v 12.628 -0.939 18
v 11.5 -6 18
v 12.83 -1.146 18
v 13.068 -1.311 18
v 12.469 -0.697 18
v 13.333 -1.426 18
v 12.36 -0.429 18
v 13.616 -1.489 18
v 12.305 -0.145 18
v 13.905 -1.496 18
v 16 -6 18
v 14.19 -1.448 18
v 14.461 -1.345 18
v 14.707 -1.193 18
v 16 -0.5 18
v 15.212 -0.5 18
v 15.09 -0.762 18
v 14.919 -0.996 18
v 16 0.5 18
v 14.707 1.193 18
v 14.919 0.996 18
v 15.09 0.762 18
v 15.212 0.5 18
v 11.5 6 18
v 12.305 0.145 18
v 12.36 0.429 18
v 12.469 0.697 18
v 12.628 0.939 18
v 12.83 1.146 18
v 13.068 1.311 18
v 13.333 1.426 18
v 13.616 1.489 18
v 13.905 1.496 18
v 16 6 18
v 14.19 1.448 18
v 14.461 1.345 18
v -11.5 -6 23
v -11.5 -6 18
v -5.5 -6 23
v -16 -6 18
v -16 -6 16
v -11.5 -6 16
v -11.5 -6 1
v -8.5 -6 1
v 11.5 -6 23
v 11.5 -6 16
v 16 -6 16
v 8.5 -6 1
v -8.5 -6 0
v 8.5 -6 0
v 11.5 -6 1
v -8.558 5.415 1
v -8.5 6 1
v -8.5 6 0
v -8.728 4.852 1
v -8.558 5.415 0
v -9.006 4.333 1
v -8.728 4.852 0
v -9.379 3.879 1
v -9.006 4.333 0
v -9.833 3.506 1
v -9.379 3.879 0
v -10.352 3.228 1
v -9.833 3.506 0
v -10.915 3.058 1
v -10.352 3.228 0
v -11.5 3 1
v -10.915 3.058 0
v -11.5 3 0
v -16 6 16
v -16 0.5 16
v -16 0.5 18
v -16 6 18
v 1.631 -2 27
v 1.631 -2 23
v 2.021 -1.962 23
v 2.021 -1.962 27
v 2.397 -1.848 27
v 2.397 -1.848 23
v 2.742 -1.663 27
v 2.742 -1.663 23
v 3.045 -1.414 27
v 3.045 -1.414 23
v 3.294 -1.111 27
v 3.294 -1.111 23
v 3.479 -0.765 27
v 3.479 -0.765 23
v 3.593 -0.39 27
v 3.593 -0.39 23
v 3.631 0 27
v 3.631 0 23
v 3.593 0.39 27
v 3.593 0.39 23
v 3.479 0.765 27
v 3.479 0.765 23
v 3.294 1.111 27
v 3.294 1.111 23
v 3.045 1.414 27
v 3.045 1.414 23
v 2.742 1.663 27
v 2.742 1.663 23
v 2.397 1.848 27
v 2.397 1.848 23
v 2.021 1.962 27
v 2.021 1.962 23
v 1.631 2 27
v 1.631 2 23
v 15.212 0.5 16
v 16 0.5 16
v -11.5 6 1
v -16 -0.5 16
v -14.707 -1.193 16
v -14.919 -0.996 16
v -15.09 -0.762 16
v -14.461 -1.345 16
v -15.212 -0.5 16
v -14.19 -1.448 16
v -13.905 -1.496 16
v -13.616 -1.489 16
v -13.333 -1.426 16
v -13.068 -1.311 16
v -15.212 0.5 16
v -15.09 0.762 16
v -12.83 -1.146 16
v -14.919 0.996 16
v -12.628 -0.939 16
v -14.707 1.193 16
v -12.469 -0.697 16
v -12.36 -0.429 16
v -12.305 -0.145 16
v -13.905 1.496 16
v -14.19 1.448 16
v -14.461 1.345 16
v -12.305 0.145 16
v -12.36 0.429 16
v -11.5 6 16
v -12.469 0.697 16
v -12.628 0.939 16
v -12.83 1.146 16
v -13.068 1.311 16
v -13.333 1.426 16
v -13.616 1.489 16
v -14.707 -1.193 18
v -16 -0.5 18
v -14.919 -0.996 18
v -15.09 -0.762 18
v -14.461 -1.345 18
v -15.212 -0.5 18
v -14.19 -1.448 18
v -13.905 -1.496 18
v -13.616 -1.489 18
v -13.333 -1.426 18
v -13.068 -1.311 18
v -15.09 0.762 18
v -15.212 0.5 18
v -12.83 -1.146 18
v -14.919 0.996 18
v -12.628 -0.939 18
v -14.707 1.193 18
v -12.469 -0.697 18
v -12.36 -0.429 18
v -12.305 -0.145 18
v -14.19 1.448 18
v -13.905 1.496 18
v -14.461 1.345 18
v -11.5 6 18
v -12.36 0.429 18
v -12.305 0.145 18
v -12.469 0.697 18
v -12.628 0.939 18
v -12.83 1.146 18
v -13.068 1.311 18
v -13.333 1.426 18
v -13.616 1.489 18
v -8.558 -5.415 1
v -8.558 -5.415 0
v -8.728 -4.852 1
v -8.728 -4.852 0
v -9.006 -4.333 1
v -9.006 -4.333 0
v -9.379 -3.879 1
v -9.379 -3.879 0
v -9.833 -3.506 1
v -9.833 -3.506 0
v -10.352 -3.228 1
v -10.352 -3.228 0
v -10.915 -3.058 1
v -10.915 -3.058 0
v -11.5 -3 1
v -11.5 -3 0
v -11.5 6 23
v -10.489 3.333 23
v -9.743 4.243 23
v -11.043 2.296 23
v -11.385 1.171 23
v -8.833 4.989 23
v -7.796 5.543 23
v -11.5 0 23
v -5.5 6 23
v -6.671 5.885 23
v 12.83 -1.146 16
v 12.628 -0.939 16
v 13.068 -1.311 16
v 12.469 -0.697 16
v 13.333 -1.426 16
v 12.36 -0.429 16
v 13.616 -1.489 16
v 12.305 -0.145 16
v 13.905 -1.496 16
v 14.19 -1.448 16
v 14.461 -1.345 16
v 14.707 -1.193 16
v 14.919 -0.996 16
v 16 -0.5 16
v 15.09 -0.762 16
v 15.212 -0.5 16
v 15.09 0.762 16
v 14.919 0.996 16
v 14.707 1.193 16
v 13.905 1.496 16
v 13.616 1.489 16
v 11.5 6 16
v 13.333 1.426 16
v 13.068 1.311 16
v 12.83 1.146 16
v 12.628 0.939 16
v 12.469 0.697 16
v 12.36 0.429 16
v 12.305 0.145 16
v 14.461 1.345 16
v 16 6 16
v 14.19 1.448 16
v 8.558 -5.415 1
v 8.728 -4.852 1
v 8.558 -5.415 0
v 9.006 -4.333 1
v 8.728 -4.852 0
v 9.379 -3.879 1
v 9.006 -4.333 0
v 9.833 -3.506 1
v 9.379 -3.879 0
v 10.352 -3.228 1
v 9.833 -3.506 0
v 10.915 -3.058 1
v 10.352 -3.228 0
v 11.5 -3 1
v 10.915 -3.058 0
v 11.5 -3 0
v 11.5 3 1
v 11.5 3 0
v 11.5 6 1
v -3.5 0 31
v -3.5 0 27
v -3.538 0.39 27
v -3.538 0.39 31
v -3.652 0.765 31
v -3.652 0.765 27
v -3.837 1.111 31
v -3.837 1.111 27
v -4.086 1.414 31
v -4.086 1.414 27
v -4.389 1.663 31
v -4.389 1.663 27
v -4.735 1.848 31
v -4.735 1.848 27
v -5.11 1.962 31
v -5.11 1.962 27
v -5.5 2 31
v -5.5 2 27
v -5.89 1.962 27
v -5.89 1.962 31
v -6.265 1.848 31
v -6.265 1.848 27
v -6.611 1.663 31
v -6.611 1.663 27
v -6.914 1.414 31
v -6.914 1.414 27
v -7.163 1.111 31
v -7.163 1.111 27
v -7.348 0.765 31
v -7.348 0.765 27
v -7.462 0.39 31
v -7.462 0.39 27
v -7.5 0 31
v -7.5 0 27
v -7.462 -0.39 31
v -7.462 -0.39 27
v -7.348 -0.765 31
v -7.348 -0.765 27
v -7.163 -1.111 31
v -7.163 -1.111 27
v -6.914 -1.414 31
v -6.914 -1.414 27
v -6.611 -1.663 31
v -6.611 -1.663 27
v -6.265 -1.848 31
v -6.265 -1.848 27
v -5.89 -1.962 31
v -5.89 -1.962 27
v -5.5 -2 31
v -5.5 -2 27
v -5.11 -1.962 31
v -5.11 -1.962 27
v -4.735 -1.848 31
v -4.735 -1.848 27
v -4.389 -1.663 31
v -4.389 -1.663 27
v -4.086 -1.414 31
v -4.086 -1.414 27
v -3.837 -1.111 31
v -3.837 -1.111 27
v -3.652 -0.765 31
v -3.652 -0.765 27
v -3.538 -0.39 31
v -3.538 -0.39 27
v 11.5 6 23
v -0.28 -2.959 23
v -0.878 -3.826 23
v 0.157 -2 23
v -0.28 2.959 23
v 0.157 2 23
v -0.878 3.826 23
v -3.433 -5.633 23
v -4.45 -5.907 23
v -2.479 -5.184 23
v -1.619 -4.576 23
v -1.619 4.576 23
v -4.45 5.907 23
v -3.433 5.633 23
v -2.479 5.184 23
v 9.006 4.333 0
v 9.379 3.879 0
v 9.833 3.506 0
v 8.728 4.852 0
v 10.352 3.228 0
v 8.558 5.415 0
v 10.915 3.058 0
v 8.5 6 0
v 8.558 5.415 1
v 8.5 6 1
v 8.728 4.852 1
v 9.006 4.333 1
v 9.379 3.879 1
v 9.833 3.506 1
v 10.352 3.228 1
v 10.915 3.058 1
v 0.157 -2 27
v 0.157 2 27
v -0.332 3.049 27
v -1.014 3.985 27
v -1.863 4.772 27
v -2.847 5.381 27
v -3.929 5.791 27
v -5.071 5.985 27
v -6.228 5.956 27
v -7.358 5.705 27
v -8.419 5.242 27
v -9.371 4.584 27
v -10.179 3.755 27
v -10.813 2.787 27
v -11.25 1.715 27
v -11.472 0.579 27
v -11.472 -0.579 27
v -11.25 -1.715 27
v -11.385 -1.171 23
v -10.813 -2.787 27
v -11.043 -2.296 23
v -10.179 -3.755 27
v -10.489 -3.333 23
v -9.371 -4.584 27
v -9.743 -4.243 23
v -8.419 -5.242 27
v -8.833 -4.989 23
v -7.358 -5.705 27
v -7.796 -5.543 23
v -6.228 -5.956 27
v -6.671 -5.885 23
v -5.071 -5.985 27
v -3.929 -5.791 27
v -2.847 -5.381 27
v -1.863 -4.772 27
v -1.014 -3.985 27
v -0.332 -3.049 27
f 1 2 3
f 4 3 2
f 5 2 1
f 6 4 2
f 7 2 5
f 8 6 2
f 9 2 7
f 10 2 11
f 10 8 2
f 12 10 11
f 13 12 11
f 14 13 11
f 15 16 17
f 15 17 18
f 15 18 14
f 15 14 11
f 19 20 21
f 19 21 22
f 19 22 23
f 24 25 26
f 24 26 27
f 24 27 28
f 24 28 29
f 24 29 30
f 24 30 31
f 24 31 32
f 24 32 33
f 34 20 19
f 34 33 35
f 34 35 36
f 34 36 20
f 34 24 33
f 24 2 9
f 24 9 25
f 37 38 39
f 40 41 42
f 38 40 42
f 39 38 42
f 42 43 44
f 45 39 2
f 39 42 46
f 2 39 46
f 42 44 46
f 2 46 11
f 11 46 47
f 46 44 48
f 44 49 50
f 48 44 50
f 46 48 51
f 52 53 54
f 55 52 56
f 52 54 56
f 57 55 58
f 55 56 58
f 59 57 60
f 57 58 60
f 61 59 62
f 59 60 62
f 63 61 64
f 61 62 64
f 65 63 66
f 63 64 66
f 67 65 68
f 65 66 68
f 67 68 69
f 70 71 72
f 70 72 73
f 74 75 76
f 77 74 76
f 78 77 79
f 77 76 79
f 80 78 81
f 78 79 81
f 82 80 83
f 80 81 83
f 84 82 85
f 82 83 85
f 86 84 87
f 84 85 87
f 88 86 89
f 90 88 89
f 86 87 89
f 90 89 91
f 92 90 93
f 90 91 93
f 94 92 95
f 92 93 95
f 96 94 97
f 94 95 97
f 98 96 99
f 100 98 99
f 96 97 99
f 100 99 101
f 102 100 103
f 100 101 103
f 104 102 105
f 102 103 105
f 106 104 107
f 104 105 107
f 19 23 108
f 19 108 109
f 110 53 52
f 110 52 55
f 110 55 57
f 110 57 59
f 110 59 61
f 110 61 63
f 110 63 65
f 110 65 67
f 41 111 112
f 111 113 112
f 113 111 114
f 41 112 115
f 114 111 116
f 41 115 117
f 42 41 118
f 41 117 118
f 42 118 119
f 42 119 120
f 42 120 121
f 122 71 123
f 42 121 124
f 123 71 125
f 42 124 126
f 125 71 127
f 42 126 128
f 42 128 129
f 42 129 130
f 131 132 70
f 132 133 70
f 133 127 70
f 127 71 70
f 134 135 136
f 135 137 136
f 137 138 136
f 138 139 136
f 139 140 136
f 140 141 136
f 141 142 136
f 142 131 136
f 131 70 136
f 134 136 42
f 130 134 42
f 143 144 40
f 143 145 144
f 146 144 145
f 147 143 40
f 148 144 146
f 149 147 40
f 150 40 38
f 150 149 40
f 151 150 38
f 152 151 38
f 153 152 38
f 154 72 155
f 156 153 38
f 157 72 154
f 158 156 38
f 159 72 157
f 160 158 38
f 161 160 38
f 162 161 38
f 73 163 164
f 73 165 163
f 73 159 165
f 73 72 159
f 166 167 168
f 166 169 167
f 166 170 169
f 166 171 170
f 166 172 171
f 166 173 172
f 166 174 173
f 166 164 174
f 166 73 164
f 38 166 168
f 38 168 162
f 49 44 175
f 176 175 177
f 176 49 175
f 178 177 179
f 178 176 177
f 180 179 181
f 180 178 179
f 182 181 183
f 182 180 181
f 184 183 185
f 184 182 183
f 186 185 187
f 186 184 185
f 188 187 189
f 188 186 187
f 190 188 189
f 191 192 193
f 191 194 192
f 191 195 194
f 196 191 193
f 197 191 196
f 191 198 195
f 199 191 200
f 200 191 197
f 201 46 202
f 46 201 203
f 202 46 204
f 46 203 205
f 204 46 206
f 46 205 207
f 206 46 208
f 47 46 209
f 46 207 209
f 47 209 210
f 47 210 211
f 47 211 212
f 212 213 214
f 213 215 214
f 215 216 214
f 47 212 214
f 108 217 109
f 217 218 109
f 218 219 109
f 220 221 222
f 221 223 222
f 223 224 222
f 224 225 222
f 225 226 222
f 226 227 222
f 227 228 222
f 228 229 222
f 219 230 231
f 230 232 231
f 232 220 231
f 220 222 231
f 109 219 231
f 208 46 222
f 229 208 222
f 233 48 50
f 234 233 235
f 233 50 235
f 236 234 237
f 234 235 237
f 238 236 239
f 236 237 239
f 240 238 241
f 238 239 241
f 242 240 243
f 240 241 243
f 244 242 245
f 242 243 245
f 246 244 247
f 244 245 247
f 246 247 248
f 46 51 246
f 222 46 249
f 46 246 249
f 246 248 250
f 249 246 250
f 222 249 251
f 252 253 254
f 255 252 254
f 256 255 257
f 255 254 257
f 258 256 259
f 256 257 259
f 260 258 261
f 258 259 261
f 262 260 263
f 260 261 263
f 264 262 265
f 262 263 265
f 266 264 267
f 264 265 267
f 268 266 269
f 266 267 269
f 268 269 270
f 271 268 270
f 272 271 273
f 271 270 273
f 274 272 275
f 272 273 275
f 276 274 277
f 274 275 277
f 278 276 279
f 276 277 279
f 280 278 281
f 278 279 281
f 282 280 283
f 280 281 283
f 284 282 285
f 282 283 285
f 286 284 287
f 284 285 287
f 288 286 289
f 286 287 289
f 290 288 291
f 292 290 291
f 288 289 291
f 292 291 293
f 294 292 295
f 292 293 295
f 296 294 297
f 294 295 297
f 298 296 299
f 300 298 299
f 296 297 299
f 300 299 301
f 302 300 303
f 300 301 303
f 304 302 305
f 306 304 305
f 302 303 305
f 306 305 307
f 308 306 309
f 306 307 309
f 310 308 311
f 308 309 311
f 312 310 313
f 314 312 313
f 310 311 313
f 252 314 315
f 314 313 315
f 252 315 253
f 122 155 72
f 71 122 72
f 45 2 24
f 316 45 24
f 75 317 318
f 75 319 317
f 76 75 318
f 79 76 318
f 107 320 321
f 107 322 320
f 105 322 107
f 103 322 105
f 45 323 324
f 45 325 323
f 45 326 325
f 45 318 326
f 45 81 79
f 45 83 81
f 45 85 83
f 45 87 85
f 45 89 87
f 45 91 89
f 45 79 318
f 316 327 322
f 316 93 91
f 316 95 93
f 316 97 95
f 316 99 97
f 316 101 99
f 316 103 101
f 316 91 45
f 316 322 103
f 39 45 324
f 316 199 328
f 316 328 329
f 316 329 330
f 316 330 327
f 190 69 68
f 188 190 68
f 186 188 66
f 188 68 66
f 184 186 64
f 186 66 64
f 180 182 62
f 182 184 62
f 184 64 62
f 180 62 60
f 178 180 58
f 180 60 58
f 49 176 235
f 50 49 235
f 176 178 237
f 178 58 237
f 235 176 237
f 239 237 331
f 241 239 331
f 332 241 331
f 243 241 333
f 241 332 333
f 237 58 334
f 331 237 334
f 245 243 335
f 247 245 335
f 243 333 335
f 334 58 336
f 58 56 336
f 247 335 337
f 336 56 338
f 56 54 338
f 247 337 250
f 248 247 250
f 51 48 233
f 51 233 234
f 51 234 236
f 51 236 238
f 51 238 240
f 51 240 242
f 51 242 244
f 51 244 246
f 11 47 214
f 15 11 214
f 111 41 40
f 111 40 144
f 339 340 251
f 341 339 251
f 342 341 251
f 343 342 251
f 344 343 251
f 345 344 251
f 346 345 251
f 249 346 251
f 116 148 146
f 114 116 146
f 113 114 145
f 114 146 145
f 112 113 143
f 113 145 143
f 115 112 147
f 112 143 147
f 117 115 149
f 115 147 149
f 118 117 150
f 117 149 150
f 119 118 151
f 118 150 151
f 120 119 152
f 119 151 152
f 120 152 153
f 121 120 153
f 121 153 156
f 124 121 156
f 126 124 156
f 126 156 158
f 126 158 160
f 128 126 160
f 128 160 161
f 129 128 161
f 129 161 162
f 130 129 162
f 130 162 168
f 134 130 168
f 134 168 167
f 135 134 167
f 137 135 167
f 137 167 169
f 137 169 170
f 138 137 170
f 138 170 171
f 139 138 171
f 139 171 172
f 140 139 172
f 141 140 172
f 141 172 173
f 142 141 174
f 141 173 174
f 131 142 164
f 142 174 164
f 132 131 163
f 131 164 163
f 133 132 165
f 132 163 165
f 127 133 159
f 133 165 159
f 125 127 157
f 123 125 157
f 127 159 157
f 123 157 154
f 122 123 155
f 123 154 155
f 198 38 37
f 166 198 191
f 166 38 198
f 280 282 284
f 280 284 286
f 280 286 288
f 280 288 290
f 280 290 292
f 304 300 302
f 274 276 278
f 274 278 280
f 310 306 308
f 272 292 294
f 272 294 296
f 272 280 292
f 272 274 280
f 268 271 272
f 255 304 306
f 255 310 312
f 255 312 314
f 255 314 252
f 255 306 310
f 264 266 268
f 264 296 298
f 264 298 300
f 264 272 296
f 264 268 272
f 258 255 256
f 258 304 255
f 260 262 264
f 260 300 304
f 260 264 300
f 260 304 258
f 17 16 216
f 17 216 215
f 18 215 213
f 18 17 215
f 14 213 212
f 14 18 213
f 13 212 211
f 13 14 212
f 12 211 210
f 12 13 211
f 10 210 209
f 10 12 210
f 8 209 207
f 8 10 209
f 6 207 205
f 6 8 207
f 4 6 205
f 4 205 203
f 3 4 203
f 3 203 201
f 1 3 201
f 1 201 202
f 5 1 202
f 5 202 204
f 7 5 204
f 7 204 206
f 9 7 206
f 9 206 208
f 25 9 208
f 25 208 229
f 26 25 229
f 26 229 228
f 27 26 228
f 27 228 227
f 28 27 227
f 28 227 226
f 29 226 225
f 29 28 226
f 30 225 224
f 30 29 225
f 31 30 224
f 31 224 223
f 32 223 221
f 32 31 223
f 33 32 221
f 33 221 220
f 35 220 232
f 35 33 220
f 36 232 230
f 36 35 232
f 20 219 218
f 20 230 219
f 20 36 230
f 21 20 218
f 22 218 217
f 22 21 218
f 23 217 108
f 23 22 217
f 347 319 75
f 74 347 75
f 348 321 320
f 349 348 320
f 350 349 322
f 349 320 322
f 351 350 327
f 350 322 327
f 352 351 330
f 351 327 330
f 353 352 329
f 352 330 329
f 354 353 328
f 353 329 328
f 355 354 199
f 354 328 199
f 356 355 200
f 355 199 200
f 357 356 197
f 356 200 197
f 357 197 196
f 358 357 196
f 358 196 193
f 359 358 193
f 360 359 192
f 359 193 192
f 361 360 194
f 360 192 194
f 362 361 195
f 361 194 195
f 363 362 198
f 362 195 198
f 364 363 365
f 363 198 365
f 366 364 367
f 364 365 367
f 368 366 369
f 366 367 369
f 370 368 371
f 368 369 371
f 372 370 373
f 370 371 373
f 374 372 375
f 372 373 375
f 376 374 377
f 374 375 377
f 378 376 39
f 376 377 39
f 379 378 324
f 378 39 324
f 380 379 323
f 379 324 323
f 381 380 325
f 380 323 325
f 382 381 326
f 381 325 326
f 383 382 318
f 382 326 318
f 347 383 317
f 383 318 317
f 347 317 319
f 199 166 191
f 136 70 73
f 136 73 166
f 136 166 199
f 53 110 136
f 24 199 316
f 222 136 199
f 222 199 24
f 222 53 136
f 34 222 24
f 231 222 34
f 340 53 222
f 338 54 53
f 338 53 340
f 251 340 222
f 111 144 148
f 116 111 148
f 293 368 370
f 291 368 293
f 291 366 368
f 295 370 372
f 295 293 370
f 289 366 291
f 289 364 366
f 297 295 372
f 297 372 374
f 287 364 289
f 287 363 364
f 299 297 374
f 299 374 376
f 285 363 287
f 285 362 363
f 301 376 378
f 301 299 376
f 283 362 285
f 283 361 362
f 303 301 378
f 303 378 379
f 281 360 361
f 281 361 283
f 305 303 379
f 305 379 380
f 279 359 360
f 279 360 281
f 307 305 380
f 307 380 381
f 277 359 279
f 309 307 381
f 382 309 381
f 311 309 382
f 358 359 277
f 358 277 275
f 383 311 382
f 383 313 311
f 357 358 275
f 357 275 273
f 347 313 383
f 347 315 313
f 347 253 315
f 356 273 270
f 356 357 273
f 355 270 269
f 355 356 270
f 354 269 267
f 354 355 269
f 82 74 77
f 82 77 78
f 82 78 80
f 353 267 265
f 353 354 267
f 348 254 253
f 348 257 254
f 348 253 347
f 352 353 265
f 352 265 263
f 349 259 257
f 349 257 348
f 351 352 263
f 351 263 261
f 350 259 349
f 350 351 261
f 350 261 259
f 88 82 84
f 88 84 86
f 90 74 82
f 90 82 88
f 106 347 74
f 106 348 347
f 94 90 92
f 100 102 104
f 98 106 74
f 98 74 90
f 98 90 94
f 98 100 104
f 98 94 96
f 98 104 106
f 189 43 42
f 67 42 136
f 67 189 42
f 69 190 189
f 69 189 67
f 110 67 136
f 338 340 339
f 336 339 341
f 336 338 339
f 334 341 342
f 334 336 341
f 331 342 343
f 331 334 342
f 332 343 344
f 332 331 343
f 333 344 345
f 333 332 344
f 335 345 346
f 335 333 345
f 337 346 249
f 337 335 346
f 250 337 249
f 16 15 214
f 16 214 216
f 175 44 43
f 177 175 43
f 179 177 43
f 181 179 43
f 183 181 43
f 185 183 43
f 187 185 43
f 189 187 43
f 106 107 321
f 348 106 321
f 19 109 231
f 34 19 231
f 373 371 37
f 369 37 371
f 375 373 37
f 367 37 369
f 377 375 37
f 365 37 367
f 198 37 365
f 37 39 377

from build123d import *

# Parameters (mm, degrees)
SKETCH_1_W               = 23
SKETCH_1_H               = 12
EXTRUDE_1_DEPTH          = 16
SKETCH_2_W               = 32
SKETCH_2_H               = 12
EXTRUDE_2_DEPTH          = 2
SKETCH_3_W               = 23
SKETCH_3_H               = 12
EXTRUDE_3_DEPTH          = 5
EXTRUDE_4_DEPTH          = 4
SKETCH_6_R               = 2
EXTRUDE_5_DEPTH          = 4
CUT_EXTRUDE_1_DEPTH      = 4
SKETCH_9_R               = 3
CUT_EXTRUDE_2_DEPTH      = 1
MIRROR_3_COPY_1_SKETCH_R = 3
MIRROR_3_COPY_1_DEPTH    = 1


with BuildPart() as part:
    # 草图1 → 凸台-拉伸1 (new body)
    with BuildSketch(Plane.XY):
        Rectangle(SKETCH_1_W, SKETCH_1_H)
    extrude(amount=EXTRUDE_1_DEPTH)

    # 草图2 → 凸台-拉伸2 (add)
    with BuildSketch(Plane.XY.offset(16)):
        Rectangle(SKETCH_2_W, SKETCH_2_H)
    extrude(amount=EXTRUDE_2_DEPTH)

    # 草图3 → 凸台-拉伸3 (add)
    with BuildSketch(Plane.XY.offset(18)):
        Rectangle(SKETCH_3_W, SKETCH_3_H)
    extrude(amount=EXTRUDE_3_DEPTH)

    # 草图4 → 凸台-拉伸4 (add)
    with BuildSketch(Plane.XY.offset(23)):
        with BuildLine():
            Line((1.631262932, 2), (0.156854249, 2))
            ThreePointArc((0.156854249, 2), (-11.5, 0), (0.156854249, -2))
            Line((0.156854249, -2), (1.631262932, -2))
            ThreePointArc((1.631262932, -2), (3.631262932, 0), (1.631262932, 2))
        make_face()
    extrude(amount=EXTRUDE_4_DEPTH)

    # 草图6 → 凸台-拉伸5 (add)
    with BuildSketch(Plane.XY.offset(27)):
        with Locations((-5.5, 0)):
            Circle(SKETCH_6_R)
    extrude(amount=EXTRUDE_5_DEPTH)

    # 草图8 → 切除-拉伸1 (cut)
    with BuildSketch(Plane.XY.offset(18)):
        with BuildLine():
            Line((15.211851697, 0.5), (16, 0.5))
            Line((16, 0.5), (16, -0.5))
            Line((16, -0.5), (15.211851697, -0.5))
            ThreePointArc((15.211851697, -0.5), (12.297638134, 0), (15.211851697, 0.5))
        make_face()
    cut_extrude_1 = extrude(amount=-CUT_EXTRUDE_1_DEPTH, mode=Mode.SUBTRACT)

    # 镜向1: 切除-拉伸1 across plane
    add(cut_extrude_1.mirror(Plane(origin=(0, 0, 0), x_dir=(0, 0, 1), z_dir=(1, 0, 0))), mode=Mode.SUBTRACT)

    # 草图9 → 切除-拉伸2 (cut)
    with BuildSketch(Plane(origin=(0, 0, 0), x_dir=(-1, 0, 0), z_dir=(0, 0, -1))):
        with Locations((11.5, 6)):
            Circle(SKETCH_9_R)
    cut_extrude_2 = extrude(amount=-CUT_EXTRUDE_2_DEPTH, mode=Mode.SUBTRACT)

    # 镜向2: 切除-拉伸2 across plane
    add(cut_extrude_2.mirror(Plane(origin=(0, 0, 0), x_dir=(0, 0, 1), z_dir=(1, 0, 0))), mode=Mode.SUBTRACT)

    # 镜向3: 切除-拉伸2 across plane
    add(cut_extrude_2.mirror(Plane.ZX), mode=Mode.SUBTRACT)

    # 镜向3 copy 1 sketch → 镜向3 copy 1 (cut)
    with BuildSketch(Plane(origin=(0, 0, 0), x_dir=(1, 0, 0), z_dir=(0, 0, -1))):
        with Locations((11.5, 6)):
            Circle(MIRROR_3_COPY_1_SKETCH_R)
    extrude(amount=-MIRROR_3_COPY_1_DEPTH, mode=Mode.SUBTRACT)


solid = part.part
